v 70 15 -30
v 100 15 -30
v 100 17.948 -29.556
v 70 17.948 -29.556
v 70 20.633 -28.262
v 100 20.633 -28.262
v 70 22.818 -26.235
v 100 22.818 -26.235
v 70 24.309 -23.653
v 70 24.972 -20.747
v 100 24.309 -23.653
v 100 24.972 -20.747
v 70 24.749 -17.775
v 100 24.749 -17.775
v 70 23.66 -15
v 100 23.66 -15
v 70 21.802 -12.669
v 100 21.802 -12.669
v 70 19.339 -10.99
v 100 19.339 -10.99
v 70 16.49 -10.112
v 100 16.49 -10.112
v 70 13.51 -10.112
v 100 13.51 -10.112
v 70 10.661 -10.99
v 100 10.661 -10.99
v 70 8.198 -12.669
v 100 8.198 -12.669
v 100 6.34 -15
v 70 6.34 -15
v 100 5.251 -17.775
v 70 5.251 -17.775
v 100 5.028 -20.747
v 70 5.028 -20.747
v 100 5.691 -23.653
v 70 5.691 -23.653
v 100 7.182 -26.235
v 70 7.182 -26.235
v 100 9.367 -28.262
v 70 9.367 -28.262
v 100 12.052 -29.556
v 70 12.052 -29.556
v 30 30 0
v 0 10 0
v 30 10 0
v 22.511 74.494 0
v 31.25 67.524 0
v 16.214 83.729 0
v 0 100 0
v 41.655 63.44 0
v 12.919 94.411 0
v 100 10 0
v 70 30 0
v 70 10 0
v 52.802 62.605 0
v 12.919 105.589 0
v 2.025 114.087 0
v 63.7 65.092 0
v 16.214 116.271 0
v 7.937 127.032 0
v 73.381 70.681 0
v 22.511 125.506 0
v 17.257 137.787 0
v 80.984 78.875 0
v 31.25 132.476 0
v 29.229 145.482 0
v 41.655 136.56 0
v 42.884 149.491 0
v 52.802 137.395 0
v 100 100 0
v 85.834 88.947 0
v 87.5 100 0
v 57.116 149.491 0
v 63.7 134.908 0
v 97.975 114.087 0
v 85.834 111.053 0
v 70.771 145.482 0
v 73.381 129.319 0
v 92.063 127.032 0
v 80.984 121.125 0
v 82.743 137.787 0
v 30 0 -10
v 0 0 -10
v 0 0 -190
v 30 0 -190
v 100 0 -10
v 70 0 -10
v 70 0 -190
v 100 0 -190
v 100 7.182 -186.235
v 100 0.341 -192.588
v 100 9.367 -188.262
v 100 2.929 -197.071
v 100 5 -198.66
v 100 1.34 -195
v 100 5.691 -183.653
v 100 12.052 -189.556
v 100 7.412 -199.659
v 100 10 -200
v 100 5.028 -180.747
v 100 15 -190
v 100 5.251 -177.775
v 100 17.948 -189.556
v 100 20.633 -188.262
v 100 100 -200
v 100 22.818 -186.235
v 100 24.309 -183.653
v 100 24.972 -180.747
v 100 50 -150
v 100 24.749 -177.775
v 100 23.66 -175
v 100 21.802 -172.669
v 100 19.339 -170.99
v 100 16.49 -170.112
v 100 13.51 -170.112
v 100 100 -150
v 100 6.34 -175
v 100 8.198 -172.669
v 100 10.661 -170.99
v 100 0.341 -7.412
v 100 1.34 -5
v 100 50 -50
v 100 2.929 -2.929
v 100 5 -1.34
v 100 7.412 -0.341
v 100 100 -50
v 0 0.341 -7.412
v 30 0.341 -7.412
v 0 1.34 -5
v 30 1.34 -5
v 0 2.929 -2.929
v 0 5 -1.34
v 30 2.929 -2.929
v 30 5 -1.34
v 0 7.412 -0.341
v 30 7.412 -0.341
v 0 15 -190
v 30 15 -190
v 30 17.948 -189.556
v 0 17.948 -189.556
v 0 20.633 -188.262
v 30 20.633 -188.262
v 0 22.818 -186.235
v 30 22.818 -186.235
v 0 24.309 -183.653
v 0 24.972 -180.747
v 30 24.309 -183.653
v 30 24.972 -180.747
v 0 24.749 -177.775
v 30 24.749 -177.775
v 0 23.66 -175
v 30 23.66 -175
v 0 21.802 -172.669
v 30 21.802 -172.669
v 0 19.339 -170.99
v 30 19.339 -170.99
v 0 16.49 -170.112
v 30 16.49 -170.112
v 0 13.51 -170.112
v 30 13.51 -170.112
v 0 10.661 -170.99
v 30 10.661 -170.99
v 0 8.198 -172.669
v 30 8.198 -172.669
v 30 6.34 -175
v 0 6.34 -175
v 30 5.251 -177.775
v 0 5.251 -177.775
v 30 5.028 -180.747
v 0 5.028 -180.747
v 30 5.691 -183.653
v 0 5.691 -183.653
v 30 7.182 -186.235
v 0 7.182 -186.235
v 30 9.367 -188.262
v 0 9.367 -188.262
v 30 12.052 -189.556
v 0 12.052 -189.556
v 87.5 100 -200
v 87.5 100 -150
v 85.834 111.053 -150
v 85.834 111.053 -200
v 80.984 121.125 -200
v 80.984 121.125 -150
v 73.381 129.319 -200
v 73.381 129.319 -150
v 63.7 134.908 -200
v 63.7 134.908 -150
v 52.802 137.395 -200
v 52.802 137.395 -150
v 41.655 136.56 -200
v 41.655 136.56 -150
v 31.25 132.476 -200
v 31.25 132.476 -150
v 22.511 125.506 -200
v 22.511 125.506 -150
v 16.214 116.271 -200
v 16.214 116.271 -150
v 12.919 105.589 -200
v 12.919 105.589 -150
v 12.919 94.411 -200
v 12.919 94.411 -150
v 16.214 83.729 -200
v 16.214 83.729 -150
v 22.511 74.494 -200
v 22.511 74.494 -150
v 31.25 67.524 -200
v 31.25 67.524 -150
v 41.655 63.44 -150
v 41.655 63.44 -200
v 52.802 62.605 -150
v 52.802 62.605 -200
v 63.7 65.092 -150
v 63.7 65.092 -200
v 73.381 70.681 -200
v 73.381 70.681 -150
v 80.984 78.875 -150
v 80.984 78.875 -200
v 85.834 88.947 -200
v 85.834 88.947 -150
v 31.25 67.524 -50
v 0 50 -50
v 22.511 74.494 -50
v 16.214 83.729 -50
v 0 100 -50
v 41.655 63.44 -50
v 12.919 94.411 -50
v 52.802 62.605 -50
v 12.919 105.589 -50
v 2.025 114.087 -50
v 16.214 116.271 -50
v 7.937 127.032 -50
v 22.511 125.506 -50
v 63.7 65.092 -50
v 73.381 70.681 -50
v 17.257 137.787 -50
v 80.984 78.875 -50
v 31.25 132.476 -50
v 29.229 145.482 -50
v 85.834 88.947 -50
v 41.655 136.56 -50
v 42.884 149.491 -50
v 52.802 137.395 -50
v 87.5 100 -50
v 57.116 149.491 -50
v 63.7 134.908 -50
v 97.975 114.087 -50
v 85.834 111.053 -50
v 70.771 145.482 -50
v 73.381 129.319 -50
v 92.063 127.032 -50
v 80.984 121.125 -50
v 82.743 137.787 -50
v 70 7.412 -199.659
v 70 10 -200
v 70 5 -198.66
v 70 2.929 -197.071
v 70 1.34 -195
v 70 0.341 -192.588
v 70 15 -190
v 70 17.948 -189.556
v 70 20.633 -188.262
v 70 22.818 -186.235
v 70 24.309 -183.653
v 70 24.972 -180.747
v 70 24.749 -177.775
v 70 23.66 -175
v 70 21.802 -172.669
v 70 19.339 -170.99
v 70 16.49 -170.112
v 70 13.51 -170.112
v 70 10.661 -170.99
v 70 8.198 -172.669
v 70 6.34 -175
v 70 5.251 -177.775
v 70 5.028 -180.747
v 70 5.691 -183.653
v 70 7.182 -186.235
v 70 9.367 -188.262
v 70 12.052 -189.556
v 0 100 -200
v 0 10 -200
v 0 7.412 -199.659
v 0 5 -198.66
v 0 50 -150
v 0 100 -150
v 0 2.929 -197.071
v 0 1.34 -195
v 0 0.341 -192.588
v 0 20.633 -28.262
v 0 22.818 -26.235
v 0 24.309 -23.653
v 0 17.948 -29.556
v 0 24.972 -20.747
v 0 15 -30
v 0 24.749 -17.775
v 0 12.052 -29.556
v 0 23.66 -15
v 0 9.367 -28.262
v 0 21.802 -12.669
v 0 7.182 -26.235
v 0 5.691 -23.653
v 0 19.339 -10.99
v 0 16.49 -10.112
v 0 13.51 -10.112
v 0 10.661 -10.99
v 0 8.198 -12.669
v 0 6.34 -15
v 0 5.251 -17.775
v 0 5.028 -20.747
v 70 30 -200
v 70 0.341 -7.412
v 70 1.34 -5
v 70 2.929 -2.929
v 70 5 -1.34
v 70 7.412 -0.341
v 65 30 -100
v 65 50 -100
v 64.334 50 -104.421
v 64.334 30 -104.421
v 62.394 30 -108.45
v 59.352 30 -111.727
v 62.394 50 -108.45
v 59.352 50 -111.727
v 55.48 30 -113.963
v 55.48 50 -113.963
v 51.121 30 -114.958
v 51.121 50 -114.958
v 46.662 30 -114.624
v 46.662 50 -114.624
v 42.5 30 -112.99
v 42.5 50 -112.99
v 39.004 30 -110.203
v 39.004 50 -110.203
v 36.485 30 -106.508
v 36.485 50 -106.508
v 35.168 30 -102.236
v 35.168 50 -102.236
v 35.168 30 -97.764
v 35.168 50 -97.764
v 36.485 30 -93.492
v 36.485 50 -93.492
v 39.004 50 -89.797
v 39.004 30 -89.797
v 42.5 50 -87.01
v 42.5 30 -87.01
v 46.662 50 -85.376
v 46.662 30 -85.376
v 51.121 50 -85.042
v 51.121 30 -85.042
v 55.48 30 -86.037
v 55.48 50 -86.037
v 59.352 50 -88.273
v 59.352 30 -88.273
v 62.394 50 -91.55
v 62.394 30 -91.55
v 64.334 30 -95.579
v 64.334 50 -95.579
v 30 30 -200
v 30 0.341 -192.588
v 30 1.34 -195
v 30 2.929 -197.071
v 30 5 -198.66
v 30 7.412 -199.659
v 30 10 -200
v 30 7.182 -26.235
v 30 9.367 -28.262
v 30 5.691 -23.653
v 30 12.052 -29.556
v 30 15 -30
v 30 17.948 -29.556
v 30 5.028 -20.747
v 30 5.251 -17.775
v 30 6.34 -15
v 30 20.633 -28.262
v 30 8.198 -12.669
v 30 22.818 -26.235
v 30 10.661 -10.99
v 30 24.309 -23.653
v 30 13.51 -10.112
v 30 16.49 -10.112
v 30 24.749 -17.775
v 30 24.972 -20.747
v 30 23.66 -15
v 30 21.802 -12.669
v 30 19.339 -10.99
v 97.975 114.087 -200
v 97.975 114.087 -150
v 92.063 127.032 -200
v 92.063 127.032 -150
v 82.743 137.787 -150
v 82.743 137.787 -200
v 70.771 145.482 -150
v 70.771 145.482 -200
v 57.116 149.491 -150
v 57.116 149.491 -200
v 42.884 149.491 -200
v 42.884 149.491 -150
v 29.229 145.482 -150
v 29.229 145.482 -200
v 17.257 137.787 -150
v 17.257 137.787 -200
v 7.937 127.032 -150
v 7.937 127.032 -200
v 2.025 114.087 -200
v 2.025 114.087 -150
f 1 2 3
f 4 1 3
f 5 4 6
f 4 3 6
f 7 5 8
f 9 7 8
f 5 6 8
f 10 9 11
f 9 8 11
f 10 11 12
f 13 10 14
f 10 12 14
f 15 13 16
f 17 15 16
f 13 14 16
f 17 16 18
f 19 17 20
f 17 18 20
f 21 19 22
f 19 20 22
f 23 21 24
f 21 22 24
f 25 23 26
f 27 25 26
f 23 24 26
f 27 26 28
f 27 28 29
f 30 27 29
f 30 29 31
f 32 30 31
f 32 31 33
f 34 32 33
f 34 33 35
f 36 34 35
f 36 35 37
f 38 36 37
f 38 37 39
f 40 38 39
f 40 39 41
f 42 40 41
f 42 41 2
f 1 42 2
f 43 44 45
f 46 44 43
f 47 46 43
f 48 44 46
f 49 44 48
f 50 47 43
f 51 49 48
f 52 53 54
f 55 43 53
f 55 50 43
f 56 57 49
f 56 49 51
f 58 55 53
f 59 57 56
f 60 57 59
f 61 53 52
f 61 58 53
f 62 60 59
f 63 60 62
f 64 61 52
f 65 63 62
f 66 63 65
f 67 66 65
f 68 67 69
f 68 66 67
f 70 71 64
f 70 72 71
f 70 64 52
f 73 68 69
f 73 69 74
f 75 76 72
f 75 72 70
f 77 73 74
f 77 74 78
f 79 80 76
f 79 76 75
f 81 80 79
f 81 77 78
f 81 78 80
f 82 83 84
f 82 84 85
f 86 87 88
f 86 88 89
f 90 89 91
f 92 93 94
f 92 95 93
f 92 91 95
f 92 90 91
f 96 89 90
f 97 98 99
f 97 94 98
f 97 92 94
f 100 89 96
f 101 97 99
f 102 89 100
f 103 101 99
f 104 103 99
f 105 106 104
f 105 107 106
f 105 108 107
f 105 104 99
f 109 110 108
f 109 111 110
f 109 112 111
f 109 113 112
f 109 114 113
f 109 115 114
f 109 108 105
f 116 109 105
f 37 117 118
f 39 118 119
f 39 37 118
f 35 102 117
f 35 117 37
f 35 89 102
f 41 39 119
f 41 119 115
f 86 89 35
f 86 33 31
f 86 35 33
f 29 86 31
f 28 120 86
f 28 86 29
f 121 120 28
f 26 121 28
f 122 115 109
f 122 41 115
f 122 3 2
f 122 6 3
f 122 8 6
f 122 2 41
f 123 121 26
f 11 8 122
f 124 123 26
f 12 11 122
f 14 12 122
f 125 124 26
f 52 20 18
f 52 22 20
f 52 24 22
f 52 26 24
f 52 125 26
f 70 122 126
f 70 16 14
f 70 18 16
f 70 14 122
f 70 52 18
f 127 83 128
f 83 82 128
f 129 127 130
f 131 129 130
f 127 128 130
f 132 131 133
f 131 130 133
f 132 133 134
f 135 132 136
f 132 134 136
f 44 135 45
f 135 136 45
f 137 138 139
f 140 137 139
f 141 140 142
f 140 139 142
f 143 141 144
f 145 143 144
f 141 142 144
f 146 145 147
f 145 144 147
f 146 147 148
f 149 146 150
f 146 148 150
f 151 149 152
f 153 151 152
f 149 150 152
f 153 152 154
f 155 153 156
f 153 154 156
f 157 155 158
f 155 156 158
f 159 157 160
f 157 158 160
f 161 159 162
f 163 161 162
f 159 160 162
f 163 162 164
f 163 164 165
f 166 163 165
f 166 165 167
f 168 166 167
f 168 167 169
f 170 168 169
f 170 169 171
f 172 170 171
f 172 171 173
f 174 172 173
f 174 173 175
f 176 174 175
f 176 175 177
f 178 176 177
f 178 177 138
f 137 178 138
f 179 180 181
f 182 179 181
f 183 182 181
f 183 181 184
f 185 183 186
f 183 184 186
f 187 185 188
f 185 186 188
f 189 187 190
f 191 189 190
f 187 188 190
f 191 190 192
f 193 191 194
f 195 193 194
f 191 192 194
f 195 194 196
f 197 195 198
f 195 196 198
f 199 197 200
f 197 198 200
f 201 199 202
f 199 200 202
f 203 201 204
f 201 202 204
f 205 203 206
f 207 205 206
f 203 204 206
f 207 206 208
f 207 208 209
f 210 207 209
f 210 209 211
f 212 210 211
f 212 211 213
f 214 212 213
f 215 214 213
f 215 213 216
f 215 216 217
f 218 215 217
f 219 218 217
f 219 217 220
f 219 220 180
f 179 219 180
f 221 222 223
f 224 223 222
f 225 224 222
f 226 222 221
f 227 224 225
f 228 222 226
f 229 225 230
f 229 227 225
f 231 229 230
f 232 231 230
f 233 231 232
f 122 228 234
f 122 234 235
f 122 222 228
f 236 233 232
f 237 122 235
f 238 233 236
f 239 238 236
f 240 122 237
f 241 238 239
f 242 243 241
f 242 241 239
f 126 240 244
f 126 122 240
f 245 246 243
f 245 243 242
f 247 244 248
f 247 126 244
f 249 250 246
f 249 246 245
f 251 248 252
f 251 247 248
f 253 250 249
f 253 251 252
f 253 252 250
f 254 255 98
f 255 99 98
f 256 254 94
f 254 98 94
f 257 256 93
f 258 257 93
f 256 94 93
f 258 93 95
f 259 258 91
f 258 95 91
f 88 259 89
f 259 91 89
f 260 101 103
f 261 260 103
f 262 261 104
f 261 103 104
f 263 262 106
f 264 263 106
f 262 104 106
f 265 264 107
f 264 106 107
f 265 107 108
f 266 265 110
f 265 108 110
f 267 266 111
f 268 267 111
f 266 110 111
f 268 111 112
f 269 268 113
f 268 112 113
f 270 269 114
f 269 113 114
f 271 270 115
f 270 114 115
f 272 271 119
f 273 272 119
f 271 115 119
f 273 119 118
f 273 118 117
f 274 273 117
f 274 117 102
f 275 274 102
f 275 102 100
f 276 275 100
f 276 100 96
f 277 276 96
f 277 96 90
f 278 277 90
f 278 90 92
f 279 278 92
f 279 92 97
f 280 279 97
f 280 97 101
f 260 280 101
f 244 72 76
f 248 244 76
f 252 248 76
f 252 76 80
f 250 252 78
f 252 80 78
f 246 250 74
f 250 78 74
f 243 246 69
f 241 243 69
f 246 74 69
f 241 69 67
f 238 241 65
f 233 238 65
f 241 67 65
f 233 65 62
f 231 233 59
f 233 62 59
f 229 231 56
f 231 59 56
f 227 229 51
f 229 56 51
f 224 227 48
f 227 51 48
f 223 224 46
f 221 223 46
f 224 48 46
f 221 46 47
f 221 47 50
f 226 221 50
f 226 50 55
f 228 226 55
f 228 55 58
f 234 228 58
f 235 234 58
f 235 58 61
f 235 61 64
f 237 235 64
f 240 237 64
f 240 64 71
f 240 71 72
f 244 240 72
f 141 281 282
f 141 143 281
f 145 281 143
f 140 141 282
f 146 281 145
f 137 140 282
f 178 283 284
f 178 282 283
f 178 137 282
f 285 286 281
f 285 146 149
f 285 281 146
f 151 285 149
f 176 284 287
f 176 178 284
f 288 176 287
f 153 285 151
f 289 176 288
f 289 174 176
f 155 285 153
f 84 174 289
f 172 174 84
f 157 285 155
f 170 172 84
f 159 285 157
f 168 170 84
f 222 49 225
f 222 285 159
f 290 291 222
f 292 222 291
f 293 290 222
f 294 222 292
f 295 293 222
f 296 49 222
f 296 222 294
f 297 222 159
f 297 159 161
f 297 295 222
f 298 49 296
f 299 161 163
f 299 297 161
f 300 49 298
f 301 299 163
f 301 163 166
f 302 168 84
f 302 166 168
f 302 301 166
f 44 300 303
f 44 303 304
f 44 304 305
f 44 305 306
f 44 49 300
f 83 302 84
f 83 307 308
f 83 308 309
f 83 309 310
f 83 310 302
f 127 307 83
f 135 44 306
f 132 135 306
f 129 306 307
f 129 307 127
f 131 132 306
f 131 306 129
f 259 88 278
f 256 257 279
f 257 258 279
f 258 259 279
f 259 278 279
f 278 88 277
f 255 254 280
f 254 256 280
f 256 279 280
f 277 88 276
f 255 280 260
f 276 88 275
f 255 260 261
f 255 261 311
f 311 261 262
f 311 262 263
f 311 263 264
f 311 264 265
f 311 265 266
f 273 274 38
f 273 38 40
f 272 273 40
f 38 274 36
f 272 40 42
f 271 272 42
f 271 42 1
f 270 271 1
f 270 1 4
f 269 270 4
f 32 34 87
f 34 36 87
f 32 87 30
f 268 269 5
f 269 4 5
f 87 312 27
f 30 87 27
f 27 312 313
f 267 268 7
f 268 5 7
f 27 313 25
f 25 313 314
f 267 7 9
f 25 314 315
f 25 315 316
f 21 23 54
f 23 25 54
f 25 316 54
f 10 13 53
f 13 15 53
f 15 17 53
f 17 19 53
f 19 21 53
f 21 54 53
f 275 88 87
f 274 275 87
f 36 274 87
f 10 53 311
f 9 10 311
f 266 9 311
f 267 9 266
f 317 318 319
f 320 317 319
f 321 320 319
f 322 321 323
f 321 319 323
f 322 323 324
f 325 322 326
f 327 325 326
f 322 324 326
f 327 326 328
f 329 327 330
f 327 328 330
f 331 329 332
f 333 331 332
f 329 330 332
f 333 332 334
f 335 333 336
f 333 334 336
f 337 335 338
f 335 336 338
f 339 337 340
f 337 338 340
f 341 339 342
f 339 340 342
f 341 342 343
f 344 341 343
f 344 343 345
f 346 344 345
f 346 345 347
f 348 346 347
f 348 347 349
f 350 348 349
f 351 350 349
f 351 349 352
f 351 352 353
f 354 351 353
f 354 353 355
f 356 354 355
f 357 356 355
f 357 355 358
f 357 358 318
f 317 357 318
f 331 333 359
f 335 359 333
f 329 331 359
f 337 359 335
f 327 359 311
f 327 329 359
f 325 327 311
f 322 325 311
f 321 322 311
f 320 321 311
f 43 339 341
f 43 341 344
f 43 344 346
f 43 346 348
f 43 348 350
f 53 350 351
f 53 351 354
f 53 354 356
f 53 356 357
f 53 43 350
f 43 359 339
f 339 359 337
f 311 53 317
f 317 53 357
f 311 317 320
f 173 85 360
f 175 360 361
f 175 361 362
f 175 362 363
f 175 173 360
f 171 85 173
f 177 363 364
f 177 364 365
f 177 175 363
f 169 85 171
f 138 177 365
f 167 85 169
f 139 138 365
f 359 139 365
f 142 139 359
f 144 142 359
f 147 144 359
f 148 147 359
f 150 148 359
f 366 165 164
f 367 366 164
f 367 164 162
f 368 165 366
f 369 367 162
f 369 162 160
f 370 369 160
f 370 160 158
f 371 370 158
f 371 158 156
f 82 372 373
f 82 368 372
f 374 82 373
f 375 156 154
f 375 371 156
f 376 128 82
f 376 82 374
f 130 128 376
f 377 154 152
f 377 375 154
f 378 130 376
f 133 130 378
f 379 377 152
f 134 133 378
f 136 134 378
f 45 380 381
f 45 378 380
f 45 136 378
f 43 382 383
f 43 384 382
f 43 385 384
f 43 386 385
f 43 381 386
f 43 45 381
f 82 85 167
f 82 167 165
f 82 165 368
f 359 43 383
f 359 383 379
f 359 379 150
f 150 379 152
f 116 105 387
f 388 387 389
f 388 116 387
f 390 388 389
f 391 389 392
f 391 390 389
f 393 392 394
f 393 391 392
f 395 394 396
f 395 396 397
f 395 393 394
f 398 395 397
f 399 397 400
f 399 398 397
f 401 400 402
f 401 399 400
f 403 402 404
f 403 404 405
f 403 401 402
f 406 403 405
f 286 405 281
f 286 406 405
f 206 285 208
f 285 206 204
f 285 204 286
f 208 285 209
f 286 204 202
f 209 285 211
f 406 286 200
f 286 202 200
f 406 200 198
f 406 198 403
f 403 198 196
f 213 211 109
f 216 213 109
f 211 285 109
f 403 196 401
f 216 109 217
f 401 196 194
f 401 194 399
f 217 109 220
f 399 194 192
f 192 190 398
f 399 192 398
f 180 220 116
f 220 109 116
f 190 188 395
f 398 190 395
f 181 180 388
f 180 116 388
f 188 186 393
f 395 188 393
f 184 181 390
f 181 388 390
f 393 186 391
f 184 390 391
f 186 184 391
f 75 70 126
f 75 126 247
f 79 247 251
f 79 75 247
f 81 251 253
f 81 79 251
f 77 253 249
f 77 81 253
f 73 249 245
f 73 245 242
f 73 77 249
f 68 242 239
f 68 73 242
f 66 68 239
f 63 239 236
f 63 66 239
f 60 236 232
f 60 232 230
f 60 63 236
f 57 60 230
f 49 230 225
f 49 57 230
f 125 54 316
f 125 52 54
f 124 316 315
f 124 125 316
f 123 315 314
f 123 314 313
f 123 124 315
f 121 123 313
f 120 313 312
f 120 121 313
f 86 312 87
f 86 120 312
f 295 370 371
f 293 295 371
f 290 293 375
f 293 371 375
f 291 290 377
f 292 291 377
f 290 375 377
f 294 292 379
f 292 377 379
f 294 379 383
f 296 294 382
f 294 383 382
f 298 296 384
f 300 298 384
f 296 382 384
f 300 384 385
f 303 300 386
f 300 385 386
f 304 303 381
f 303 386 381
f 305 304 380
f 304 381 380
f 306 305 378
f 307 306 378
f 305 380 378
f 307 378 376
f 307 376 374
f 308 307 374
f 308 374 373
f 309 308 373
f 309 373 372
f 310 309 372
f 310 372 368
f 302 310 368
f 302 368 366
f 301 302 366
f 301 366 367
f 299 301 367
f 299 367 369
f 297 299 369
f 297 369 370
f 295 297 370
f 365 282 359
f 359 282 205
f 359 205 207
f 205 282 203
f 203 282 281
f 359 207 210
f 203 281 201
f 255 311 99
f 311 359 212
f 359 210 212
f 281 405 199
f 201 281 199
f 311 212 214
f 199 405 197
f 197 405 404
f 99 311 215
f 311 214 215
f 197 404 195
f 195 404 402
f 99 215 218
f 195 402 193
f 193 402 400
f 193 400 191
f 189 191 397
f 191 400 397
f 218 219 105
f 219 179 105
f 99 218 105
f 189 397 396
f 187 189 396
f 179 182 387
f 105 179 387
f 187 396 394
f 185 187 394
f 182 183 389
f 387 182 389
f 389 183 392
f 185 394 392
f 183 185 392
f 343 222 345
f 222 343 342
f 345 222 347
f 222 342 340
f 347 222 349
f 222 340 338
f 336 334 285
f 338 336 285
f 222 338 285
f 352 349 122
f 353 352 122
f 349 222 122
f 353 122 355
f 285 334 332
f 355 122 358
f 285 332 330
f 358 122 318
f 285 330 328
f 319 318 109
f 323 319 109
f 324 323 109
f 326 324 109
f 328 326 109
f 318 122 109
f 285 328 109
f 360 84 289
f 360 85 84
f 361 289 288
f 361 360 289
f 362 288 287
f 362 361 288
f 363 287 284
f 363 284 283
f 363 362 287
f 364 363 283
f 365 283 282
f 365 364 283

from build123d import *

# Parameters (mm, degrees)
BOSS_EXTRUDE1_DEPTH = 200
SKETCH2_R           = 37.5
SKETCH2_W           = 40
SKETCH2_H           = 30
CUT_EXTRUDE1_DEPTH  = 200
SKETCH3_R           = 10
SKETCH3_W           = 100
SKETCH3_H           = 100
CUT_EXTRUDE2_DEPTH  = 200
SKETCH4_R           = 15
CUT_EXTRUDE3_DEPTH  = 200
FILLET1_R           = 10


with BuildPart() as part:
    # Sketch1 → Boss-Extrude1 (new body)
    with BuildSketch(Plane.XY):
        with BuildLine():
            Line((0, 0), (100, 0))
            Line((100, 0), (100, 100))
            ThreePointArc((100, 100), (50, 150), (0, 100))
            Line((0, 100), (0, 0))
        make_face()
    extrude(amount=-BOSS_EXTRUDE1_DEPTH)

    # Sketch2 → Cut-Extrude1 (cut)
    with BuildSketch(Plane.XY):
        with Locations((50, 100)):
            Circle(SKETCH2_R)
        with Locations((50, 15)):
            Rectangle(SKETCH2_W, SKETCH2_H)
    extrude(amount=-CUT_EXTRUDE1_DEPTH, mode=Mode.SUBTRACT)

    # Sketch3 → Cut-Extrude2 (cut)
    with BuildSketch(Plane(origin=(100, 0, 0), x_dir=(0, 0, -1), z_dir=(1, 0, 0))):
        with Locations((20, 15)):
            Circle(SKETCH3_R)
        with Locations((180, 15)):
            Circle(SKETCH3_R)
        with Locations((100, 100)):
            Rectangle(SKETCH3_W, SKETCH3_H)
    extrude(amount=-CUT_EXTRUDE2_DEPTH, mode=Mode.SUBTRACT)

    # Sketch4 → Cut-Extrude3 (cut)
    with BuildSketch(Plane(origin=(0, 50, 0), x_dir=(1, 0, 0), z_dir=(0, 1, 0))):
        with Locations((50, 100)):
            Circle(SKETCH4_R)
    extrude(amount=-CUT_EXTRUDE3_DEPTH, mode=Mode.SUBTRACT)

    # Fillet1
    fillet1_edges = [part.edges().sort_by_distance(p)[0] for p in [
        (85, 0, 0),
        (85, 0, -200),
        (15, 0, 0),
        (15, 0, -200),
    ]]
    fillet(fillet1_edges, radius=FILLET1_R)


solid = part.part
